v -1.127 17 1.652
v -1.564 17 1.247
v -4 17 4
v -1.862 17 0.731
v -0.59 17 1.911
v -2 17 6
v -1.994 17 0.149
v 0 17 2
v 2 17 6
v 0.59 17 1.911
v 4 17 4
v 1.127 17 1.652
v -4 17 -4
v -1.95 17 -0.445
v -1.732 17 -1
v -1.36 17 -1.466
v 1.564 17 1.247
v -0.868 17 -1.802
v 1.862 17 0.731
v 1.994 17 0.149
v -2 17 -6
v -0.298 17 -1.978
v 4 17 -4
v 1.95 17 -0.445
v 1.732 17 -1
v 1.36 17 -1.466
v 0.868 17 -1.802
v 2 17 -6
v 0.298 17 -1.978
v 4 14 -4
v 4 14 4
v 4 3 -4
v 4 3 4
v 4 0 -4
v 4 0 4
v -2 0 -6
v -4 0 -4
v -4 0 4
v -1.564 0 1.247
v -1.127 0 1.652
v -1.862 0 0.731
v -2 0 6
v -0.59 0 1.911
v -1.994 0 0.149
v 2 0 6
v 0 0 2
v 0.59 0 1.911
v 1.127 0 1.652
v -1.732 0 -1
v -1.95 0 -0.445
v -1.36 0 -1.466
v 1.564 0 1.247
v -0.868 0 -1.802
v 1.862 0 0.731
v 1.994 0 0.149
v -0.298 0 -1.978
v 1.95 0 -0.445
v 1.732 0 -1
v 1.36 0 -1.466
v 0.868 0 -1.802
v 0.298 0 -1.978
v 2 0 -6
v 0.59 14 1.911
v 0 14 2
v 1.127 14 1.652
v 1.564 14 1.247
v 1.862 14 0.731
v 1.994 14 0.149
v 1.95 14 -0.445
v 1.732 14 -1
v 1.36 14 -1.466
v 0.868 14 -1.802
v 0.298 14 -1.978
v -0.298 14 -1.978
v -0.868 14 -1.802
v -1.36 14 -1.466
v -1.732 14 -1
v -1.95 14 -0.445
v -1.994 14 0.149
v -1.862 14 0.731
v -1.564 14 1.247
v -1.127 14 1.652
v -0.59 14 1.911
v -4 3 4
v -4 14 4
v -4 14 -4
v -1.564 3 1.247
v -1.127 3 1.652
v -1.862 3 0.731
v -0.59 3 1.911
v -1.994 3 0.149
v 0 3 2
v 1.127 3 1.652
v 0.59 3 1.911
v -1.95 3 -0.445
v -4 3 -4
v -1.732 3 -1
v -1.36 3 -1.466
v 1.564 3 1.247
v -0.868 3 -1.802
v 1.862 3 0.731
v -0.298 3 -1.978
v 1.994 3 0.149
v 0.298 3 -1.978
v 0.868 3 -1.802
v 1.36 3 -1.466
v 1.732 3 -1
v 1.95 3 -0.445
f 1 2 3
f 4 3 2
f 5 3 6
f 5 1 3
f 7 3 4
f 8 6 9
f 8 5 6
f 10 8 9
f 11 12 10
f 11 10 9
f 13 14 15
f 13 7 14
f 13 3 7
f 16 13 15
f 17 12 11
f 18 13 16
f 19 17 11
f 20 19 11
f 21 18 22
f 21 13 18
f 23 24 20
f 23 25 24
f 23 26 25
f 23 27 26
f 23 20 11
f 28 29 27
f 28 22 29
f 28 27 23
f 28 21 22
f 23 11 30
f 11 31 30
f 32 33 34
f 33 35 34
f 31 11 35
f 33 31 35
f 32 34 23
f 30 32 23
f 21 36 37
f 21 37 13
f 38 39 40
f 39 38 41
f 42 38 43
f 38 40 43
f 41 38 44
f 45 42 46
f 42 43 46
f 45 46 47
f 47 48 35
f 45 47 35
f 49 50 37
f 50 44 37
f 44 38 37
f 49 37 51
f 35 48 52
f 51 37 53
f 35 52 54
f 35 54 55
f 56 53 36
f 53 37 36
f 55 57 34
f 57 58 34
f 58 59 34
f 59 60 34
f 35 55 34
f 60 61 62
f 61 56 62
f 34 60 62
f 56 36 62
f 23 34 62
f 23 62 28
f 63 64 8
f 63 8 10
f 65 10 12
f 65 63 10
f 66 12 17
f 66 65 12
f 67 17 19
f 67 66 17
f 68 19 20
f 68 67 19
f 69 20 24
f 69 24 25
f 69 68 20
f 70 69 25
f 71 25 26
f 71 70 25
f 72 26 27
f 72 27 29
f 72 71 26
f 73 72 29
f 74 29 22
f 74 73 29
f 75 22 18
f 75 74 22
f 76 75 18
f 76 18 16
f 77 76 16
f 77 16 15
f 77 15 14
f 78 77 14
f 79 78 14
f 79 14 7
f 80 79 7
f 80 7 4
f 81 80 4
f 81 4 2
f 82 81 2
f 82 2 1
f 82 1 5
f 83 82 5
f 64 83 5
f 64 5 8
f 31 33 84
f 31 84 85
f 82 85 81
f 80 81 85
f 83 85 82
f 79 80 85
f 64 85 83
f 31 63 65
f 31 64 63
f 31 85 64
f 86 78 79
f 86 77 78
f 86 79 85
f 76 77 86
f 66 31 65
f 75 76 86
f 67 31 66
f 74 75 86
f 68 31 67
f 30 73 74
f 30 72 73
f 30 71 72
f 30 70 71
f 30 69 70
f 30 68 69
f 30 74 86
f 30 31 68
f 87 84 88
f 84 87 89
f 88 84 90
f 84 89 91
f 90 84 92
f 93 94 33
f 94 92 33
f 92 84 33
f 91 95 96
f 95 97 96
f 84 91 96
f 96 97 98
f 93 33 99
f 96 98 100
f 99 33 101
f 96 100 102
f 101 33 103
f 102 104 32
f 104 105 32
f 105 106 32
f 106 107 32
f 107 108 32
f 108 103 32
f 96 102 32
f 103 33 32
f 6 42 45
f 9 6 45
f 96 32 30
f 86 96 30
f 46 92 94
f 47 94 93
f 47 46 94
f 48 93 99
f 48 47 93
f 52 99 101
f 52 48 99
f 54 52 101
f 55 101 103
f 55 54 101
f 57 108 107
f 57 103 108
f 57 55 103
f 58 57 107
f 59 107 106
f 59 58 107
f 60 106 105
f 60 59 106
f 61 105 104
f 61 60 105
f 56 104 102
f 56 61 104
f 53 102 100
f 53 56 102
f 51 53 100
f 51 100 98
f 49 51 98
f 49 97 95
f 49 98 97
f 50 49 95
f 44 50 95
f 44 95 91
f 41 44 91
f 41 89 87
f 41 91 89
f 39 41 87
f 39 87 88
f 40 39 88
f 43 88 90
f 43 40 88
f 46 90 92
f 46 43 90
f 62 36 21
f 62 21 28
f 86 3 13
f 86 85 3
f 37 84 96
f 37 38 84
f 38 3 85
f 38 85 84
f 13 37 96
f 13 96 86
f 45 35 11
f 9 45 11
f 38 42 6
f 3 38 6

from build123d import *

# Parameters (mm, degrees)
SKETCH1_W           = 8
SKETCH1_H           = 12
SKETCH1_R           = 2
BOSS_EXTRUDE1_DEPTH = 17
SKETCH2_W           = 8
SKETCH2_H           = 11
CUT_EXTRUDE1_DEPTH  = 17
CHAMFER1_SIZE       = 2


with BuildPart() as part:
    # Sketch1 → Boss-Extrude1 (new body)
    with BuildSketch(Plane(origin=(0, 0, 0), x_dir=(1, 0, 0), z_dir=(0, 1, 0))):
        Rectangle(SKETCH1_W, SKETCH1_H)
        with Locations(Location((0, 0, 0), (0, 0, 270))):
            Circle(SKETCH1_R, mode=Mode.SUBTRACT)
    extrude(amount=BOSS_EXTRUDE1_DEPTH)

    # Sketch2 → Cut-Extrude1 (cut)
    with BuildSketch(Plane(origin=(4, 0, 0), x_dir=(0, 0, -1), z_dir=(1, 0, 0))):
        with Locations((0, 8.5)):
            Rectangle(SKETCH2_W, SKETCH2_H)
    extrude(amount=-CUT_EXTRUDE1_DEPTH, mode=Mode.SUBTRACT)

    # Chamfer1
    chamfer1_edges = [part.edges().sort_by_distance(p)[0] for p in [
        (4, 8.5, 6),
        (-4, 8.5, 6),
        (-4, 8.5, -6),
        (4, 8.5, -6),
    ]]
    chamfer(chamfer1_edges, length=CHAMFER1_SIZE - 0.0001)  # a hair under: the kernel refuses the full size


solid = part.part
